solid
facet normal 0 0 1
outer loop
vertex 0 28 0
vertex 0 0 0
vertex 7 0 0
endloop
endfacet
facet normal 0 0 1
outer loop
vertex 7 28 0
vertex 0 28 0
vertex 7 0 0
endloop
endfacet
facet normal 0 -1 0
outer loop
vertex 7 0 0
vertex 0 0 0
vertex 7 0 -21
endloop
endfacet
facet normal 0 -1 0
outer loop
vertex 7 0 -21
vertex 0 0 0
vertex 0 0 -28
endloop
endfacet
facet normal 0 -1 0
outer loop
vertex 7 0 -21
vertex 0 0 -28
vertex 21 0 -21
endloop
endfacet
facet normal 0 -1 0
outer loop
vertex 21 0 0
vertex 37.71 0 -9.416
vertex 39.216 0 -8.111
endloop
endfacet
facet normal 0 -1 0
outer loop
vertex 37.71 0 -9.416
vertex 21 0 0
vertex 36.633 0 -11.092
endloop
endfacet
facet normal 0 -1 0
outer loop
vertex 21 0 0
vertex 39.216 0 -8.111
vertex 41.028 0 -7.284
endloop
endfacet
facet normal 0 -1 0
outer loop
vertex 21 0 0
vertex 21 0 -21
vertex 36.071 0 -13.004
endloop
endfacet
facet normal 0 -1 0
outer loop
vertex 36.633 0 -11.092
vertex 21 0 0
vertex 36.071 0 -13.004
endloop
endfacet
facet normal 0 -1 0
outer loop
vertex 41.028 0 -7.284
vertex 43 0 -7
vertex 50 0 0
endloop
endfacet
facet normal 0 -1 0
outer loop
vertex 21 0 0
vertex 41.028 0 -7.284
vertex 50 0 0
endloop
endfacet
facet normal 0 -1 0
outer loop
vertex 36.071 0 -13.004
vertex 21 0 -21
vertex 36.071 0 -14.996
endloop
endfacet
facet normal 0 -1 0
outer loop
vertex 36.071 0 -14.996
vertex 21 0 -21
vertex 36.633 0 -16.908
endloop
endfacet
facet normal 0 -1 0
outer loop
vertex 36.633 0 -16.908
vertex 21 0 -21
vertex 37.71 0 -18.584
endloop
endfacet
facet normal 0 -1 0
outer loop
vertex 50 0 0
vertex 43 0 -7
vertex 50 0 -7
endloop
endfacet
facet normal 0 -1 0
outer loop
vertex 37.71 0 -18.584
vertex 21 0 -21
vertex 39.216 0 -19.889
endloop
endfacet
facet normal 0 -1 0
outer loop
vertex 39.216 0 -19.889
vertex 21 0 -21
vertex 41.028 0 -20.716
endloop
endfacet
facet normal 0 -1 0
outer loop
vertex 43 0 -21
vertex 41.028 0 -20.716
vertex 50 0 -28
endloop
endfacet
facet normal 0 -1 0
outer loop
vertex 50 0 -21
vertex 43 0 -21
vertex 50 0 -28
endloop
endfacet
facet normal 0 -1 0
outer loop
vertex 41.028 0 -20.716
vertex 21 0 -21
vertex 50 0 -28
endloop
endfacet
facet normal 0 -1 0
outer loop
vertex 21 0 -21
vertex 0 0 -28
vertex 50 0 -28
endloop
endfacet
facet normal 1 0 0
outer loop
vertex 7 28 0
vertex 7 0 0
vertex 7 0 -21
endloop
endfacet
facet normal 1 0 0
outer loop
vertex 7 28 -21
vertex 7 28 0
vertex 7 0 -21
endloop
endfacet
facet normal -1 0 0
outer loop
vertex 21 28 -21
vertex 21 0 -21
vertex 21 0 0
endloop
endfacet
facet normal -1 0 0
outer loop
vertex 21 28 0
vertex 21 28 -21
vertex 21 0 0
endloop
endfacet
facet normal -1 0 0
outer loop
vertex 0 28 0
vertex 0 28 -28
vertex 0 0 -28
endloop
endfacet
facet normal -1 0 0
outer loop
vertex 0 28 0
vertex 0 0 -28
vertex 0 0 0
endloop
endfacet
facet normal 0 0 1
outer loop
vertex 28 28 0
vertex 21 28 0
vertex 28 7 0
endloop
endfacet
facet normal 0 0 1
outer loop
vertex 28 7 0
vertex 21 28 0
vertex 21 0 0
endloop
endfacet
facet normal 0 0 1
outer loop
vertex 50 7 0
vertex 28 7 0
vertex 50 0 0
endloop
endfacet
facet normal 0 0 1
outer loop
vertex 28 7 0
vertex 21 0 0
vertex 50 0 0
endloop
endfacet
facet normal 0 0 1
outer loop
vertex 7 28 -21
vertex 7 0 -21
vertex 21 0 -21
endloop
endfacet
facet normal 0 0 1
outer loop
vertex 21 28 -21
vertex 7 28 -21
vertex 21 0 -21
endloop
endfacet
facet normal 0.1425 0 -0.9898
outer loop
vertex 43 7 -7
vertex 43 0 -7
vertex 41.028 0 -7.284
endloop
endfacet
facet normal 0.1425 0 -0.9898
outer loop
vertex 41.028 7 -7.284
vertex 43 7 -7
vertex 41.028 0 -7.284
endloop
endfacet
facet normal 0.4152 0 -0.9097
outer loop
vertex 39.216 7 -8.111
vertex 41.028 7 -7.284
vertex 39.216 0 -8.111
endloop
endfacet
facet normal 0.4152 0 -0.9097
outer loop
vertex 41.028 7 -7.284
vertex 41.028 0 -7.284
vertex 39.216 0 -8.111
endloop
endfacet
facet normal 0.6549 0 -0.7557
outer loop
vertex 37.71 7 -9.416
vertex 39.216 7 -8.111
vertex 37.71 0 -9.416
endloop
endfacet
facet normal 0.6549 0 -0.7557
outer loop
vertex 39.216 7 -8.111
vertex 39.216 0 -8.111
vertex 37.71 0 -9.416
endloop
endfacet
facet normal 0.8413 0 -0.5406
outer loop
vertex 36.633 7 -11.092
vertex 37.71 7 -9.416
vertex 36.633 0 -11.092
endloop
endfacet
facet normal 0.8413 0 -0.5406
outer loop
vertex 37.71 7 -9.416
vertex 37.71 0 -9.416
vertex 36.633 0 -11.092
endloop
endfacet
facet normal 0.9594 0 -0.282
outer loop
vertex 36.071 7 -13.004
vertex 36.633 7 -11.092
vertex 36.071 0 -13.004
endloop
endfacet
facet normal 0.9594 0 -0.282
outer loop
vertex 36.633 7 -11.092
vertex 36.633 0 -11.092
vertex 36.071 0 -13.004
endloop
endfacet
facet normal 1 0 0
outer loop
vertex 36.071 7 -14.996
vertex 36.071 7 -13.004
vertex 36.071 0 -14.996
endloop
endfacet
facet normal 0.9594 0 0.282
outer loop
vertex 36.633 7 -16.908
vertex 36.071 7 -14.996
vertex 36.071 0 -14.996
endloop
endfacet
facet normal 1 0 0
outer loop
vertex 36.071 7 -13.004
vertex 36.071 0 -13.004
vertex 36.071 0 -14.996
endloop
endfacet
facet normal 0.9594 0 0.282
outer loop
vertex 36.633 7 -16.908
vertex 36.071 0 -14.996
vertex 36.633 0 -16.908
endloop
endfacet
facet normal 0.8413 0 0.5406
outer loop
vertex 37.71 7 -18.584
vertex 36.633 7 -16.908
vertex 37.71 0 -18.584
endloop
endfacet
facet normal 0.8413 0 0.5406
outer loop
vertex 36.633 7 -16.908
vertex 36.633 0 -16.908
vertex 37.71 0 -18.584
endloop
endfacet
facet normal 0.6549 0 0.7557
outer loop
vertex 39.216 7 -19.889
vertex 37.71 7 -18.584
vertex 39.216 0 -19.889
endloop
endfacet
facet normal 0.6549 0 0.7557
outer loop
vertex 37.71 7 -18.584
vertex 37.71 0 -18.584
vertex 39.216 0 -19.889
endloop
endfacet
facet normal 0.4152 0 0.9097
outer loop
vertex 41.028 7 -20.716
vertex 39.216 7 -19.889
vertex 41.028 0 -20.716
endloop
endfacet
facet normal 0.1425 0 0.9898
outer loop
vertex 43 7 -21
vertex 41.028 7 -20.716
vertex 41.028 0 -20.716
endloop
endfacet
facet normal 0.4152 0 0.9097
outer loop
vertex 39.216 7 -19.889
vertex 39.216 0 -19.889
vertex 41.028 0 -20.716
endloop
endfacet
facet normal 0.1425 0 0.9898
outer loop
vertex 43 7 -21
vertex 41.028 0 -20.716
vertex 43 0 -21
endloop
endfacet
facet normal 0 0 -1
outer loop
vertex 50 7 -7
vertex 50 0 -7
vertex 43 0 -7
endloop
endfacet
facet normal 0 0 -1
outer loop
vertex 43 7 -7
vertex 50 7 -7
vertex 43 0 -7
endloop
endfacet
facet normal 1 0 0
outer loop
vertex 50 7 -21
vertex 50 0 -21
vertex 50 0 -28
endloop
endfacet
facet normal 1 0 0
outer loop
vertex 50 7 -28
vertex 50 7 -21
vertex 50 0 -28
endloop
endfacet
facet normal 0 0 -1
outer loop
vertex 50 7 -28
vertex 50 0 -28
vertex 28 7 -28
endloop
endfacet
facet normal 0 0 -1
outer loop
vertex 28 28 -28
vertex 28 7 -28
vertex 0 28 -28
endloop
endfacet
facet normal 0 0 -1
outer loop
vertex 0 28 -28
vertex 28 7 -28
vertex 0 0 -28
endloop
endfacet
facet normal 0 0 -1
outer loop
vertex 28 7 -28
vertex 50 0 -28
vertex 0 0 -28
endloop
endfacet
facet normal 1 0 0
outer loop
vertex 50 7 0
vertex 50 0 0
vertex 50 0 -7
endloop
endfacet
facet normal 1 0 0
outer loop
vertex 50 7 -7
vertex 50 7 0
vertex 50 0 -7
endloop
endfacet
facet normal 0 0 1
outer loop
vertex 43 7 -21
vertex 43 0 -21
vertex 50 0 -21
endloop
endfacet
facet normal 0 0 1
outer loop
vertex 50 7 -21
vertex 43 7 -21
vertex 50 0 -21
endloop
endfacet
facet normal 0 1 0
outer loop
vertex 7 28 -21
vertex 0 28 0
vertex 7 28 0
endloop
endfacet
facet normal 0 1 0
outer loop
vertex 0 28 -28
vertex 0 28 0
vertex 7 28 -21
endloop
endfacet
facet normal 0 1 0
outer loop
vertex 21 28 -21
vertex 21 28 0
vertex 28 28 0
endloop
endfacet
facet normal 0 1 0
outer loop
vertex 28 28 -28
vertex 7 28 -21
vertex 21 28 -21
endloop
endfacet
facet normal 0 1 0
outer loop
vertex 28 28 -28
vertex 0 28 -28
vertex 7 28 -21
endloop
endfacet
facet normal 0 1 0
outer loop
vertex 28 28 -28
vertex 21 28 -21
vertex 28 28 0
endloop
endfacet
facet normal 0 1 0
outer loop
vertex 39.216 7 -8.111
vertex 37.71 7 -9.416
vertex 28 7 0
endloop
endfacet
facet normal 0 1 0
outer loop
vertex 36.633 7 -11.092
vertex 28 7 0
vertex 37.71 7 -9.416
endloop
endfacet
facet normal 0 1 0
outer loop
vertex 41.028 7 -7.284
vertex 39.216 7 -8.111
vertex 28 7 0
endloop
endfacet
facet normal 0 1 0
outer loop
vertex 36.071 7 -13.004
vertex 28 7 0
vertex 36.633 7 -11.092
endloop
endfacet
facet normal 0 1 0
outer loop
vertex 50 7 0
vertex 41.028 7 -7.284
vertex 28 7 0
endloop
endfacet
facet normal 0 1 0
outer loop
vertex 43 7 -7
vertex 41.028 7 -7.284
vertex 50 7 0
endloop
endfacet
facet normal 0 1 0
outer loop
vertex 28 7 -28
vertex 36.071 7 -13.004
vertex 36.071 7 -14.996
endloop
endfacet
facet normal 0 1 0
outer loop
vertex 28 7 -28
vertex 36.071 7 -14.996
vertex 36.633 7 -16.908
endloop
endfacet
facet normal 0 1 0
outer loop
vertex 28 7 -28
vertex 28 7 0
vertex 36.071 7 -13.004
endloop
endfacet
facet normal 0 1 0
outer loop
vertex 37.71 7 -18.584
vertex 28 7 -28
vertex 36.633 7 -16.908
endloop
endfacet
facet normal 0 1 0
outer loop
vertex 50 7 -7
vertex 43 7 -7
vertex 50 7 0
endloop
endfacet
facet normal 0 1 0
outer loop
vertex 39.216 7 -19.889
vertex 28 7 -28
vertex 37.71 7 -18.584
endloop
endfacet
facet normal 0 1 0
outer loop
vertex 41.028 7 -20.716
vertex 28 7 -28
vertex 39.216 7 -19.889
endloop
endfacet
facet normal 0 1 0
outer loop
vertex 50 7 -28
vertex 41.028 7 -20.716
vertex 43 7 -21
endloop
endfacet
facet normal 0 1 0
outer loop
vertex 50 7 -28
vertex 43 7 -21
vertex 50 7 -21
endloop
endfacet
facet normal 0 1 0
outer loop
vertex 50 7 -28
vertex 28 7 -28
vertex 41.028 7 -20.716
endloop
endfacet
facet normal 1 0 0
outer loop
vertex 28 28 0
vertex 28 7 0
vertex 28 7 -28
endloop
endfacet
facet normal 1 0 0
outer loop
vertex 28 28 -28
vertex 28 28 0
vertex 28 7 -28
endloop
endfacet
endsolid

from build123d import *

# Parameters (mm, degrees)
BOSS_EXTRUDE1_DEPTH = 7
BOSS_EXTRUDE2_DEPTH = 28


with BuildPart() as part:
    # Sketch1 → Boss-Extrude1 (new body)
    with BuildSketch(Plane(origin=(0, 0, 0), x_dir=(1, 0, 0), z_dir=(0, 1, 0))):
        with BuildLine():
            Line((50, 28), (28, 28))
            Line((28, 28), (28, 0))
            Line((28, 0), (50, 0))
            Line((50, 0), (50, 7))
            Line((50, 7), (43, 7))
            ThreePointArc((43, 7), (36, 14), (43, 21))
            Line((43, 21), (50, 21))
            Line((50, 21), (50, 28))
        make_face()
    extrude(amount=BOSS_EXTRUDE1_DEPTH)

    # Sketch1<3> → Boss-Extrude2 (add)
    with BuildSketch(Plane(origin=(0, 0, 0), x_dir=(1, 0, 0), z_dir=(0, 1, 0))):
        Polygon((0, 28), (0, 0), (7, 0), (7, 21), (21, 21), (21, 0), (28, 0), (28, 28), align=None)
    extrude(amount=BOSS_EXTRUDE2_DEPTH)


solid = part.part
